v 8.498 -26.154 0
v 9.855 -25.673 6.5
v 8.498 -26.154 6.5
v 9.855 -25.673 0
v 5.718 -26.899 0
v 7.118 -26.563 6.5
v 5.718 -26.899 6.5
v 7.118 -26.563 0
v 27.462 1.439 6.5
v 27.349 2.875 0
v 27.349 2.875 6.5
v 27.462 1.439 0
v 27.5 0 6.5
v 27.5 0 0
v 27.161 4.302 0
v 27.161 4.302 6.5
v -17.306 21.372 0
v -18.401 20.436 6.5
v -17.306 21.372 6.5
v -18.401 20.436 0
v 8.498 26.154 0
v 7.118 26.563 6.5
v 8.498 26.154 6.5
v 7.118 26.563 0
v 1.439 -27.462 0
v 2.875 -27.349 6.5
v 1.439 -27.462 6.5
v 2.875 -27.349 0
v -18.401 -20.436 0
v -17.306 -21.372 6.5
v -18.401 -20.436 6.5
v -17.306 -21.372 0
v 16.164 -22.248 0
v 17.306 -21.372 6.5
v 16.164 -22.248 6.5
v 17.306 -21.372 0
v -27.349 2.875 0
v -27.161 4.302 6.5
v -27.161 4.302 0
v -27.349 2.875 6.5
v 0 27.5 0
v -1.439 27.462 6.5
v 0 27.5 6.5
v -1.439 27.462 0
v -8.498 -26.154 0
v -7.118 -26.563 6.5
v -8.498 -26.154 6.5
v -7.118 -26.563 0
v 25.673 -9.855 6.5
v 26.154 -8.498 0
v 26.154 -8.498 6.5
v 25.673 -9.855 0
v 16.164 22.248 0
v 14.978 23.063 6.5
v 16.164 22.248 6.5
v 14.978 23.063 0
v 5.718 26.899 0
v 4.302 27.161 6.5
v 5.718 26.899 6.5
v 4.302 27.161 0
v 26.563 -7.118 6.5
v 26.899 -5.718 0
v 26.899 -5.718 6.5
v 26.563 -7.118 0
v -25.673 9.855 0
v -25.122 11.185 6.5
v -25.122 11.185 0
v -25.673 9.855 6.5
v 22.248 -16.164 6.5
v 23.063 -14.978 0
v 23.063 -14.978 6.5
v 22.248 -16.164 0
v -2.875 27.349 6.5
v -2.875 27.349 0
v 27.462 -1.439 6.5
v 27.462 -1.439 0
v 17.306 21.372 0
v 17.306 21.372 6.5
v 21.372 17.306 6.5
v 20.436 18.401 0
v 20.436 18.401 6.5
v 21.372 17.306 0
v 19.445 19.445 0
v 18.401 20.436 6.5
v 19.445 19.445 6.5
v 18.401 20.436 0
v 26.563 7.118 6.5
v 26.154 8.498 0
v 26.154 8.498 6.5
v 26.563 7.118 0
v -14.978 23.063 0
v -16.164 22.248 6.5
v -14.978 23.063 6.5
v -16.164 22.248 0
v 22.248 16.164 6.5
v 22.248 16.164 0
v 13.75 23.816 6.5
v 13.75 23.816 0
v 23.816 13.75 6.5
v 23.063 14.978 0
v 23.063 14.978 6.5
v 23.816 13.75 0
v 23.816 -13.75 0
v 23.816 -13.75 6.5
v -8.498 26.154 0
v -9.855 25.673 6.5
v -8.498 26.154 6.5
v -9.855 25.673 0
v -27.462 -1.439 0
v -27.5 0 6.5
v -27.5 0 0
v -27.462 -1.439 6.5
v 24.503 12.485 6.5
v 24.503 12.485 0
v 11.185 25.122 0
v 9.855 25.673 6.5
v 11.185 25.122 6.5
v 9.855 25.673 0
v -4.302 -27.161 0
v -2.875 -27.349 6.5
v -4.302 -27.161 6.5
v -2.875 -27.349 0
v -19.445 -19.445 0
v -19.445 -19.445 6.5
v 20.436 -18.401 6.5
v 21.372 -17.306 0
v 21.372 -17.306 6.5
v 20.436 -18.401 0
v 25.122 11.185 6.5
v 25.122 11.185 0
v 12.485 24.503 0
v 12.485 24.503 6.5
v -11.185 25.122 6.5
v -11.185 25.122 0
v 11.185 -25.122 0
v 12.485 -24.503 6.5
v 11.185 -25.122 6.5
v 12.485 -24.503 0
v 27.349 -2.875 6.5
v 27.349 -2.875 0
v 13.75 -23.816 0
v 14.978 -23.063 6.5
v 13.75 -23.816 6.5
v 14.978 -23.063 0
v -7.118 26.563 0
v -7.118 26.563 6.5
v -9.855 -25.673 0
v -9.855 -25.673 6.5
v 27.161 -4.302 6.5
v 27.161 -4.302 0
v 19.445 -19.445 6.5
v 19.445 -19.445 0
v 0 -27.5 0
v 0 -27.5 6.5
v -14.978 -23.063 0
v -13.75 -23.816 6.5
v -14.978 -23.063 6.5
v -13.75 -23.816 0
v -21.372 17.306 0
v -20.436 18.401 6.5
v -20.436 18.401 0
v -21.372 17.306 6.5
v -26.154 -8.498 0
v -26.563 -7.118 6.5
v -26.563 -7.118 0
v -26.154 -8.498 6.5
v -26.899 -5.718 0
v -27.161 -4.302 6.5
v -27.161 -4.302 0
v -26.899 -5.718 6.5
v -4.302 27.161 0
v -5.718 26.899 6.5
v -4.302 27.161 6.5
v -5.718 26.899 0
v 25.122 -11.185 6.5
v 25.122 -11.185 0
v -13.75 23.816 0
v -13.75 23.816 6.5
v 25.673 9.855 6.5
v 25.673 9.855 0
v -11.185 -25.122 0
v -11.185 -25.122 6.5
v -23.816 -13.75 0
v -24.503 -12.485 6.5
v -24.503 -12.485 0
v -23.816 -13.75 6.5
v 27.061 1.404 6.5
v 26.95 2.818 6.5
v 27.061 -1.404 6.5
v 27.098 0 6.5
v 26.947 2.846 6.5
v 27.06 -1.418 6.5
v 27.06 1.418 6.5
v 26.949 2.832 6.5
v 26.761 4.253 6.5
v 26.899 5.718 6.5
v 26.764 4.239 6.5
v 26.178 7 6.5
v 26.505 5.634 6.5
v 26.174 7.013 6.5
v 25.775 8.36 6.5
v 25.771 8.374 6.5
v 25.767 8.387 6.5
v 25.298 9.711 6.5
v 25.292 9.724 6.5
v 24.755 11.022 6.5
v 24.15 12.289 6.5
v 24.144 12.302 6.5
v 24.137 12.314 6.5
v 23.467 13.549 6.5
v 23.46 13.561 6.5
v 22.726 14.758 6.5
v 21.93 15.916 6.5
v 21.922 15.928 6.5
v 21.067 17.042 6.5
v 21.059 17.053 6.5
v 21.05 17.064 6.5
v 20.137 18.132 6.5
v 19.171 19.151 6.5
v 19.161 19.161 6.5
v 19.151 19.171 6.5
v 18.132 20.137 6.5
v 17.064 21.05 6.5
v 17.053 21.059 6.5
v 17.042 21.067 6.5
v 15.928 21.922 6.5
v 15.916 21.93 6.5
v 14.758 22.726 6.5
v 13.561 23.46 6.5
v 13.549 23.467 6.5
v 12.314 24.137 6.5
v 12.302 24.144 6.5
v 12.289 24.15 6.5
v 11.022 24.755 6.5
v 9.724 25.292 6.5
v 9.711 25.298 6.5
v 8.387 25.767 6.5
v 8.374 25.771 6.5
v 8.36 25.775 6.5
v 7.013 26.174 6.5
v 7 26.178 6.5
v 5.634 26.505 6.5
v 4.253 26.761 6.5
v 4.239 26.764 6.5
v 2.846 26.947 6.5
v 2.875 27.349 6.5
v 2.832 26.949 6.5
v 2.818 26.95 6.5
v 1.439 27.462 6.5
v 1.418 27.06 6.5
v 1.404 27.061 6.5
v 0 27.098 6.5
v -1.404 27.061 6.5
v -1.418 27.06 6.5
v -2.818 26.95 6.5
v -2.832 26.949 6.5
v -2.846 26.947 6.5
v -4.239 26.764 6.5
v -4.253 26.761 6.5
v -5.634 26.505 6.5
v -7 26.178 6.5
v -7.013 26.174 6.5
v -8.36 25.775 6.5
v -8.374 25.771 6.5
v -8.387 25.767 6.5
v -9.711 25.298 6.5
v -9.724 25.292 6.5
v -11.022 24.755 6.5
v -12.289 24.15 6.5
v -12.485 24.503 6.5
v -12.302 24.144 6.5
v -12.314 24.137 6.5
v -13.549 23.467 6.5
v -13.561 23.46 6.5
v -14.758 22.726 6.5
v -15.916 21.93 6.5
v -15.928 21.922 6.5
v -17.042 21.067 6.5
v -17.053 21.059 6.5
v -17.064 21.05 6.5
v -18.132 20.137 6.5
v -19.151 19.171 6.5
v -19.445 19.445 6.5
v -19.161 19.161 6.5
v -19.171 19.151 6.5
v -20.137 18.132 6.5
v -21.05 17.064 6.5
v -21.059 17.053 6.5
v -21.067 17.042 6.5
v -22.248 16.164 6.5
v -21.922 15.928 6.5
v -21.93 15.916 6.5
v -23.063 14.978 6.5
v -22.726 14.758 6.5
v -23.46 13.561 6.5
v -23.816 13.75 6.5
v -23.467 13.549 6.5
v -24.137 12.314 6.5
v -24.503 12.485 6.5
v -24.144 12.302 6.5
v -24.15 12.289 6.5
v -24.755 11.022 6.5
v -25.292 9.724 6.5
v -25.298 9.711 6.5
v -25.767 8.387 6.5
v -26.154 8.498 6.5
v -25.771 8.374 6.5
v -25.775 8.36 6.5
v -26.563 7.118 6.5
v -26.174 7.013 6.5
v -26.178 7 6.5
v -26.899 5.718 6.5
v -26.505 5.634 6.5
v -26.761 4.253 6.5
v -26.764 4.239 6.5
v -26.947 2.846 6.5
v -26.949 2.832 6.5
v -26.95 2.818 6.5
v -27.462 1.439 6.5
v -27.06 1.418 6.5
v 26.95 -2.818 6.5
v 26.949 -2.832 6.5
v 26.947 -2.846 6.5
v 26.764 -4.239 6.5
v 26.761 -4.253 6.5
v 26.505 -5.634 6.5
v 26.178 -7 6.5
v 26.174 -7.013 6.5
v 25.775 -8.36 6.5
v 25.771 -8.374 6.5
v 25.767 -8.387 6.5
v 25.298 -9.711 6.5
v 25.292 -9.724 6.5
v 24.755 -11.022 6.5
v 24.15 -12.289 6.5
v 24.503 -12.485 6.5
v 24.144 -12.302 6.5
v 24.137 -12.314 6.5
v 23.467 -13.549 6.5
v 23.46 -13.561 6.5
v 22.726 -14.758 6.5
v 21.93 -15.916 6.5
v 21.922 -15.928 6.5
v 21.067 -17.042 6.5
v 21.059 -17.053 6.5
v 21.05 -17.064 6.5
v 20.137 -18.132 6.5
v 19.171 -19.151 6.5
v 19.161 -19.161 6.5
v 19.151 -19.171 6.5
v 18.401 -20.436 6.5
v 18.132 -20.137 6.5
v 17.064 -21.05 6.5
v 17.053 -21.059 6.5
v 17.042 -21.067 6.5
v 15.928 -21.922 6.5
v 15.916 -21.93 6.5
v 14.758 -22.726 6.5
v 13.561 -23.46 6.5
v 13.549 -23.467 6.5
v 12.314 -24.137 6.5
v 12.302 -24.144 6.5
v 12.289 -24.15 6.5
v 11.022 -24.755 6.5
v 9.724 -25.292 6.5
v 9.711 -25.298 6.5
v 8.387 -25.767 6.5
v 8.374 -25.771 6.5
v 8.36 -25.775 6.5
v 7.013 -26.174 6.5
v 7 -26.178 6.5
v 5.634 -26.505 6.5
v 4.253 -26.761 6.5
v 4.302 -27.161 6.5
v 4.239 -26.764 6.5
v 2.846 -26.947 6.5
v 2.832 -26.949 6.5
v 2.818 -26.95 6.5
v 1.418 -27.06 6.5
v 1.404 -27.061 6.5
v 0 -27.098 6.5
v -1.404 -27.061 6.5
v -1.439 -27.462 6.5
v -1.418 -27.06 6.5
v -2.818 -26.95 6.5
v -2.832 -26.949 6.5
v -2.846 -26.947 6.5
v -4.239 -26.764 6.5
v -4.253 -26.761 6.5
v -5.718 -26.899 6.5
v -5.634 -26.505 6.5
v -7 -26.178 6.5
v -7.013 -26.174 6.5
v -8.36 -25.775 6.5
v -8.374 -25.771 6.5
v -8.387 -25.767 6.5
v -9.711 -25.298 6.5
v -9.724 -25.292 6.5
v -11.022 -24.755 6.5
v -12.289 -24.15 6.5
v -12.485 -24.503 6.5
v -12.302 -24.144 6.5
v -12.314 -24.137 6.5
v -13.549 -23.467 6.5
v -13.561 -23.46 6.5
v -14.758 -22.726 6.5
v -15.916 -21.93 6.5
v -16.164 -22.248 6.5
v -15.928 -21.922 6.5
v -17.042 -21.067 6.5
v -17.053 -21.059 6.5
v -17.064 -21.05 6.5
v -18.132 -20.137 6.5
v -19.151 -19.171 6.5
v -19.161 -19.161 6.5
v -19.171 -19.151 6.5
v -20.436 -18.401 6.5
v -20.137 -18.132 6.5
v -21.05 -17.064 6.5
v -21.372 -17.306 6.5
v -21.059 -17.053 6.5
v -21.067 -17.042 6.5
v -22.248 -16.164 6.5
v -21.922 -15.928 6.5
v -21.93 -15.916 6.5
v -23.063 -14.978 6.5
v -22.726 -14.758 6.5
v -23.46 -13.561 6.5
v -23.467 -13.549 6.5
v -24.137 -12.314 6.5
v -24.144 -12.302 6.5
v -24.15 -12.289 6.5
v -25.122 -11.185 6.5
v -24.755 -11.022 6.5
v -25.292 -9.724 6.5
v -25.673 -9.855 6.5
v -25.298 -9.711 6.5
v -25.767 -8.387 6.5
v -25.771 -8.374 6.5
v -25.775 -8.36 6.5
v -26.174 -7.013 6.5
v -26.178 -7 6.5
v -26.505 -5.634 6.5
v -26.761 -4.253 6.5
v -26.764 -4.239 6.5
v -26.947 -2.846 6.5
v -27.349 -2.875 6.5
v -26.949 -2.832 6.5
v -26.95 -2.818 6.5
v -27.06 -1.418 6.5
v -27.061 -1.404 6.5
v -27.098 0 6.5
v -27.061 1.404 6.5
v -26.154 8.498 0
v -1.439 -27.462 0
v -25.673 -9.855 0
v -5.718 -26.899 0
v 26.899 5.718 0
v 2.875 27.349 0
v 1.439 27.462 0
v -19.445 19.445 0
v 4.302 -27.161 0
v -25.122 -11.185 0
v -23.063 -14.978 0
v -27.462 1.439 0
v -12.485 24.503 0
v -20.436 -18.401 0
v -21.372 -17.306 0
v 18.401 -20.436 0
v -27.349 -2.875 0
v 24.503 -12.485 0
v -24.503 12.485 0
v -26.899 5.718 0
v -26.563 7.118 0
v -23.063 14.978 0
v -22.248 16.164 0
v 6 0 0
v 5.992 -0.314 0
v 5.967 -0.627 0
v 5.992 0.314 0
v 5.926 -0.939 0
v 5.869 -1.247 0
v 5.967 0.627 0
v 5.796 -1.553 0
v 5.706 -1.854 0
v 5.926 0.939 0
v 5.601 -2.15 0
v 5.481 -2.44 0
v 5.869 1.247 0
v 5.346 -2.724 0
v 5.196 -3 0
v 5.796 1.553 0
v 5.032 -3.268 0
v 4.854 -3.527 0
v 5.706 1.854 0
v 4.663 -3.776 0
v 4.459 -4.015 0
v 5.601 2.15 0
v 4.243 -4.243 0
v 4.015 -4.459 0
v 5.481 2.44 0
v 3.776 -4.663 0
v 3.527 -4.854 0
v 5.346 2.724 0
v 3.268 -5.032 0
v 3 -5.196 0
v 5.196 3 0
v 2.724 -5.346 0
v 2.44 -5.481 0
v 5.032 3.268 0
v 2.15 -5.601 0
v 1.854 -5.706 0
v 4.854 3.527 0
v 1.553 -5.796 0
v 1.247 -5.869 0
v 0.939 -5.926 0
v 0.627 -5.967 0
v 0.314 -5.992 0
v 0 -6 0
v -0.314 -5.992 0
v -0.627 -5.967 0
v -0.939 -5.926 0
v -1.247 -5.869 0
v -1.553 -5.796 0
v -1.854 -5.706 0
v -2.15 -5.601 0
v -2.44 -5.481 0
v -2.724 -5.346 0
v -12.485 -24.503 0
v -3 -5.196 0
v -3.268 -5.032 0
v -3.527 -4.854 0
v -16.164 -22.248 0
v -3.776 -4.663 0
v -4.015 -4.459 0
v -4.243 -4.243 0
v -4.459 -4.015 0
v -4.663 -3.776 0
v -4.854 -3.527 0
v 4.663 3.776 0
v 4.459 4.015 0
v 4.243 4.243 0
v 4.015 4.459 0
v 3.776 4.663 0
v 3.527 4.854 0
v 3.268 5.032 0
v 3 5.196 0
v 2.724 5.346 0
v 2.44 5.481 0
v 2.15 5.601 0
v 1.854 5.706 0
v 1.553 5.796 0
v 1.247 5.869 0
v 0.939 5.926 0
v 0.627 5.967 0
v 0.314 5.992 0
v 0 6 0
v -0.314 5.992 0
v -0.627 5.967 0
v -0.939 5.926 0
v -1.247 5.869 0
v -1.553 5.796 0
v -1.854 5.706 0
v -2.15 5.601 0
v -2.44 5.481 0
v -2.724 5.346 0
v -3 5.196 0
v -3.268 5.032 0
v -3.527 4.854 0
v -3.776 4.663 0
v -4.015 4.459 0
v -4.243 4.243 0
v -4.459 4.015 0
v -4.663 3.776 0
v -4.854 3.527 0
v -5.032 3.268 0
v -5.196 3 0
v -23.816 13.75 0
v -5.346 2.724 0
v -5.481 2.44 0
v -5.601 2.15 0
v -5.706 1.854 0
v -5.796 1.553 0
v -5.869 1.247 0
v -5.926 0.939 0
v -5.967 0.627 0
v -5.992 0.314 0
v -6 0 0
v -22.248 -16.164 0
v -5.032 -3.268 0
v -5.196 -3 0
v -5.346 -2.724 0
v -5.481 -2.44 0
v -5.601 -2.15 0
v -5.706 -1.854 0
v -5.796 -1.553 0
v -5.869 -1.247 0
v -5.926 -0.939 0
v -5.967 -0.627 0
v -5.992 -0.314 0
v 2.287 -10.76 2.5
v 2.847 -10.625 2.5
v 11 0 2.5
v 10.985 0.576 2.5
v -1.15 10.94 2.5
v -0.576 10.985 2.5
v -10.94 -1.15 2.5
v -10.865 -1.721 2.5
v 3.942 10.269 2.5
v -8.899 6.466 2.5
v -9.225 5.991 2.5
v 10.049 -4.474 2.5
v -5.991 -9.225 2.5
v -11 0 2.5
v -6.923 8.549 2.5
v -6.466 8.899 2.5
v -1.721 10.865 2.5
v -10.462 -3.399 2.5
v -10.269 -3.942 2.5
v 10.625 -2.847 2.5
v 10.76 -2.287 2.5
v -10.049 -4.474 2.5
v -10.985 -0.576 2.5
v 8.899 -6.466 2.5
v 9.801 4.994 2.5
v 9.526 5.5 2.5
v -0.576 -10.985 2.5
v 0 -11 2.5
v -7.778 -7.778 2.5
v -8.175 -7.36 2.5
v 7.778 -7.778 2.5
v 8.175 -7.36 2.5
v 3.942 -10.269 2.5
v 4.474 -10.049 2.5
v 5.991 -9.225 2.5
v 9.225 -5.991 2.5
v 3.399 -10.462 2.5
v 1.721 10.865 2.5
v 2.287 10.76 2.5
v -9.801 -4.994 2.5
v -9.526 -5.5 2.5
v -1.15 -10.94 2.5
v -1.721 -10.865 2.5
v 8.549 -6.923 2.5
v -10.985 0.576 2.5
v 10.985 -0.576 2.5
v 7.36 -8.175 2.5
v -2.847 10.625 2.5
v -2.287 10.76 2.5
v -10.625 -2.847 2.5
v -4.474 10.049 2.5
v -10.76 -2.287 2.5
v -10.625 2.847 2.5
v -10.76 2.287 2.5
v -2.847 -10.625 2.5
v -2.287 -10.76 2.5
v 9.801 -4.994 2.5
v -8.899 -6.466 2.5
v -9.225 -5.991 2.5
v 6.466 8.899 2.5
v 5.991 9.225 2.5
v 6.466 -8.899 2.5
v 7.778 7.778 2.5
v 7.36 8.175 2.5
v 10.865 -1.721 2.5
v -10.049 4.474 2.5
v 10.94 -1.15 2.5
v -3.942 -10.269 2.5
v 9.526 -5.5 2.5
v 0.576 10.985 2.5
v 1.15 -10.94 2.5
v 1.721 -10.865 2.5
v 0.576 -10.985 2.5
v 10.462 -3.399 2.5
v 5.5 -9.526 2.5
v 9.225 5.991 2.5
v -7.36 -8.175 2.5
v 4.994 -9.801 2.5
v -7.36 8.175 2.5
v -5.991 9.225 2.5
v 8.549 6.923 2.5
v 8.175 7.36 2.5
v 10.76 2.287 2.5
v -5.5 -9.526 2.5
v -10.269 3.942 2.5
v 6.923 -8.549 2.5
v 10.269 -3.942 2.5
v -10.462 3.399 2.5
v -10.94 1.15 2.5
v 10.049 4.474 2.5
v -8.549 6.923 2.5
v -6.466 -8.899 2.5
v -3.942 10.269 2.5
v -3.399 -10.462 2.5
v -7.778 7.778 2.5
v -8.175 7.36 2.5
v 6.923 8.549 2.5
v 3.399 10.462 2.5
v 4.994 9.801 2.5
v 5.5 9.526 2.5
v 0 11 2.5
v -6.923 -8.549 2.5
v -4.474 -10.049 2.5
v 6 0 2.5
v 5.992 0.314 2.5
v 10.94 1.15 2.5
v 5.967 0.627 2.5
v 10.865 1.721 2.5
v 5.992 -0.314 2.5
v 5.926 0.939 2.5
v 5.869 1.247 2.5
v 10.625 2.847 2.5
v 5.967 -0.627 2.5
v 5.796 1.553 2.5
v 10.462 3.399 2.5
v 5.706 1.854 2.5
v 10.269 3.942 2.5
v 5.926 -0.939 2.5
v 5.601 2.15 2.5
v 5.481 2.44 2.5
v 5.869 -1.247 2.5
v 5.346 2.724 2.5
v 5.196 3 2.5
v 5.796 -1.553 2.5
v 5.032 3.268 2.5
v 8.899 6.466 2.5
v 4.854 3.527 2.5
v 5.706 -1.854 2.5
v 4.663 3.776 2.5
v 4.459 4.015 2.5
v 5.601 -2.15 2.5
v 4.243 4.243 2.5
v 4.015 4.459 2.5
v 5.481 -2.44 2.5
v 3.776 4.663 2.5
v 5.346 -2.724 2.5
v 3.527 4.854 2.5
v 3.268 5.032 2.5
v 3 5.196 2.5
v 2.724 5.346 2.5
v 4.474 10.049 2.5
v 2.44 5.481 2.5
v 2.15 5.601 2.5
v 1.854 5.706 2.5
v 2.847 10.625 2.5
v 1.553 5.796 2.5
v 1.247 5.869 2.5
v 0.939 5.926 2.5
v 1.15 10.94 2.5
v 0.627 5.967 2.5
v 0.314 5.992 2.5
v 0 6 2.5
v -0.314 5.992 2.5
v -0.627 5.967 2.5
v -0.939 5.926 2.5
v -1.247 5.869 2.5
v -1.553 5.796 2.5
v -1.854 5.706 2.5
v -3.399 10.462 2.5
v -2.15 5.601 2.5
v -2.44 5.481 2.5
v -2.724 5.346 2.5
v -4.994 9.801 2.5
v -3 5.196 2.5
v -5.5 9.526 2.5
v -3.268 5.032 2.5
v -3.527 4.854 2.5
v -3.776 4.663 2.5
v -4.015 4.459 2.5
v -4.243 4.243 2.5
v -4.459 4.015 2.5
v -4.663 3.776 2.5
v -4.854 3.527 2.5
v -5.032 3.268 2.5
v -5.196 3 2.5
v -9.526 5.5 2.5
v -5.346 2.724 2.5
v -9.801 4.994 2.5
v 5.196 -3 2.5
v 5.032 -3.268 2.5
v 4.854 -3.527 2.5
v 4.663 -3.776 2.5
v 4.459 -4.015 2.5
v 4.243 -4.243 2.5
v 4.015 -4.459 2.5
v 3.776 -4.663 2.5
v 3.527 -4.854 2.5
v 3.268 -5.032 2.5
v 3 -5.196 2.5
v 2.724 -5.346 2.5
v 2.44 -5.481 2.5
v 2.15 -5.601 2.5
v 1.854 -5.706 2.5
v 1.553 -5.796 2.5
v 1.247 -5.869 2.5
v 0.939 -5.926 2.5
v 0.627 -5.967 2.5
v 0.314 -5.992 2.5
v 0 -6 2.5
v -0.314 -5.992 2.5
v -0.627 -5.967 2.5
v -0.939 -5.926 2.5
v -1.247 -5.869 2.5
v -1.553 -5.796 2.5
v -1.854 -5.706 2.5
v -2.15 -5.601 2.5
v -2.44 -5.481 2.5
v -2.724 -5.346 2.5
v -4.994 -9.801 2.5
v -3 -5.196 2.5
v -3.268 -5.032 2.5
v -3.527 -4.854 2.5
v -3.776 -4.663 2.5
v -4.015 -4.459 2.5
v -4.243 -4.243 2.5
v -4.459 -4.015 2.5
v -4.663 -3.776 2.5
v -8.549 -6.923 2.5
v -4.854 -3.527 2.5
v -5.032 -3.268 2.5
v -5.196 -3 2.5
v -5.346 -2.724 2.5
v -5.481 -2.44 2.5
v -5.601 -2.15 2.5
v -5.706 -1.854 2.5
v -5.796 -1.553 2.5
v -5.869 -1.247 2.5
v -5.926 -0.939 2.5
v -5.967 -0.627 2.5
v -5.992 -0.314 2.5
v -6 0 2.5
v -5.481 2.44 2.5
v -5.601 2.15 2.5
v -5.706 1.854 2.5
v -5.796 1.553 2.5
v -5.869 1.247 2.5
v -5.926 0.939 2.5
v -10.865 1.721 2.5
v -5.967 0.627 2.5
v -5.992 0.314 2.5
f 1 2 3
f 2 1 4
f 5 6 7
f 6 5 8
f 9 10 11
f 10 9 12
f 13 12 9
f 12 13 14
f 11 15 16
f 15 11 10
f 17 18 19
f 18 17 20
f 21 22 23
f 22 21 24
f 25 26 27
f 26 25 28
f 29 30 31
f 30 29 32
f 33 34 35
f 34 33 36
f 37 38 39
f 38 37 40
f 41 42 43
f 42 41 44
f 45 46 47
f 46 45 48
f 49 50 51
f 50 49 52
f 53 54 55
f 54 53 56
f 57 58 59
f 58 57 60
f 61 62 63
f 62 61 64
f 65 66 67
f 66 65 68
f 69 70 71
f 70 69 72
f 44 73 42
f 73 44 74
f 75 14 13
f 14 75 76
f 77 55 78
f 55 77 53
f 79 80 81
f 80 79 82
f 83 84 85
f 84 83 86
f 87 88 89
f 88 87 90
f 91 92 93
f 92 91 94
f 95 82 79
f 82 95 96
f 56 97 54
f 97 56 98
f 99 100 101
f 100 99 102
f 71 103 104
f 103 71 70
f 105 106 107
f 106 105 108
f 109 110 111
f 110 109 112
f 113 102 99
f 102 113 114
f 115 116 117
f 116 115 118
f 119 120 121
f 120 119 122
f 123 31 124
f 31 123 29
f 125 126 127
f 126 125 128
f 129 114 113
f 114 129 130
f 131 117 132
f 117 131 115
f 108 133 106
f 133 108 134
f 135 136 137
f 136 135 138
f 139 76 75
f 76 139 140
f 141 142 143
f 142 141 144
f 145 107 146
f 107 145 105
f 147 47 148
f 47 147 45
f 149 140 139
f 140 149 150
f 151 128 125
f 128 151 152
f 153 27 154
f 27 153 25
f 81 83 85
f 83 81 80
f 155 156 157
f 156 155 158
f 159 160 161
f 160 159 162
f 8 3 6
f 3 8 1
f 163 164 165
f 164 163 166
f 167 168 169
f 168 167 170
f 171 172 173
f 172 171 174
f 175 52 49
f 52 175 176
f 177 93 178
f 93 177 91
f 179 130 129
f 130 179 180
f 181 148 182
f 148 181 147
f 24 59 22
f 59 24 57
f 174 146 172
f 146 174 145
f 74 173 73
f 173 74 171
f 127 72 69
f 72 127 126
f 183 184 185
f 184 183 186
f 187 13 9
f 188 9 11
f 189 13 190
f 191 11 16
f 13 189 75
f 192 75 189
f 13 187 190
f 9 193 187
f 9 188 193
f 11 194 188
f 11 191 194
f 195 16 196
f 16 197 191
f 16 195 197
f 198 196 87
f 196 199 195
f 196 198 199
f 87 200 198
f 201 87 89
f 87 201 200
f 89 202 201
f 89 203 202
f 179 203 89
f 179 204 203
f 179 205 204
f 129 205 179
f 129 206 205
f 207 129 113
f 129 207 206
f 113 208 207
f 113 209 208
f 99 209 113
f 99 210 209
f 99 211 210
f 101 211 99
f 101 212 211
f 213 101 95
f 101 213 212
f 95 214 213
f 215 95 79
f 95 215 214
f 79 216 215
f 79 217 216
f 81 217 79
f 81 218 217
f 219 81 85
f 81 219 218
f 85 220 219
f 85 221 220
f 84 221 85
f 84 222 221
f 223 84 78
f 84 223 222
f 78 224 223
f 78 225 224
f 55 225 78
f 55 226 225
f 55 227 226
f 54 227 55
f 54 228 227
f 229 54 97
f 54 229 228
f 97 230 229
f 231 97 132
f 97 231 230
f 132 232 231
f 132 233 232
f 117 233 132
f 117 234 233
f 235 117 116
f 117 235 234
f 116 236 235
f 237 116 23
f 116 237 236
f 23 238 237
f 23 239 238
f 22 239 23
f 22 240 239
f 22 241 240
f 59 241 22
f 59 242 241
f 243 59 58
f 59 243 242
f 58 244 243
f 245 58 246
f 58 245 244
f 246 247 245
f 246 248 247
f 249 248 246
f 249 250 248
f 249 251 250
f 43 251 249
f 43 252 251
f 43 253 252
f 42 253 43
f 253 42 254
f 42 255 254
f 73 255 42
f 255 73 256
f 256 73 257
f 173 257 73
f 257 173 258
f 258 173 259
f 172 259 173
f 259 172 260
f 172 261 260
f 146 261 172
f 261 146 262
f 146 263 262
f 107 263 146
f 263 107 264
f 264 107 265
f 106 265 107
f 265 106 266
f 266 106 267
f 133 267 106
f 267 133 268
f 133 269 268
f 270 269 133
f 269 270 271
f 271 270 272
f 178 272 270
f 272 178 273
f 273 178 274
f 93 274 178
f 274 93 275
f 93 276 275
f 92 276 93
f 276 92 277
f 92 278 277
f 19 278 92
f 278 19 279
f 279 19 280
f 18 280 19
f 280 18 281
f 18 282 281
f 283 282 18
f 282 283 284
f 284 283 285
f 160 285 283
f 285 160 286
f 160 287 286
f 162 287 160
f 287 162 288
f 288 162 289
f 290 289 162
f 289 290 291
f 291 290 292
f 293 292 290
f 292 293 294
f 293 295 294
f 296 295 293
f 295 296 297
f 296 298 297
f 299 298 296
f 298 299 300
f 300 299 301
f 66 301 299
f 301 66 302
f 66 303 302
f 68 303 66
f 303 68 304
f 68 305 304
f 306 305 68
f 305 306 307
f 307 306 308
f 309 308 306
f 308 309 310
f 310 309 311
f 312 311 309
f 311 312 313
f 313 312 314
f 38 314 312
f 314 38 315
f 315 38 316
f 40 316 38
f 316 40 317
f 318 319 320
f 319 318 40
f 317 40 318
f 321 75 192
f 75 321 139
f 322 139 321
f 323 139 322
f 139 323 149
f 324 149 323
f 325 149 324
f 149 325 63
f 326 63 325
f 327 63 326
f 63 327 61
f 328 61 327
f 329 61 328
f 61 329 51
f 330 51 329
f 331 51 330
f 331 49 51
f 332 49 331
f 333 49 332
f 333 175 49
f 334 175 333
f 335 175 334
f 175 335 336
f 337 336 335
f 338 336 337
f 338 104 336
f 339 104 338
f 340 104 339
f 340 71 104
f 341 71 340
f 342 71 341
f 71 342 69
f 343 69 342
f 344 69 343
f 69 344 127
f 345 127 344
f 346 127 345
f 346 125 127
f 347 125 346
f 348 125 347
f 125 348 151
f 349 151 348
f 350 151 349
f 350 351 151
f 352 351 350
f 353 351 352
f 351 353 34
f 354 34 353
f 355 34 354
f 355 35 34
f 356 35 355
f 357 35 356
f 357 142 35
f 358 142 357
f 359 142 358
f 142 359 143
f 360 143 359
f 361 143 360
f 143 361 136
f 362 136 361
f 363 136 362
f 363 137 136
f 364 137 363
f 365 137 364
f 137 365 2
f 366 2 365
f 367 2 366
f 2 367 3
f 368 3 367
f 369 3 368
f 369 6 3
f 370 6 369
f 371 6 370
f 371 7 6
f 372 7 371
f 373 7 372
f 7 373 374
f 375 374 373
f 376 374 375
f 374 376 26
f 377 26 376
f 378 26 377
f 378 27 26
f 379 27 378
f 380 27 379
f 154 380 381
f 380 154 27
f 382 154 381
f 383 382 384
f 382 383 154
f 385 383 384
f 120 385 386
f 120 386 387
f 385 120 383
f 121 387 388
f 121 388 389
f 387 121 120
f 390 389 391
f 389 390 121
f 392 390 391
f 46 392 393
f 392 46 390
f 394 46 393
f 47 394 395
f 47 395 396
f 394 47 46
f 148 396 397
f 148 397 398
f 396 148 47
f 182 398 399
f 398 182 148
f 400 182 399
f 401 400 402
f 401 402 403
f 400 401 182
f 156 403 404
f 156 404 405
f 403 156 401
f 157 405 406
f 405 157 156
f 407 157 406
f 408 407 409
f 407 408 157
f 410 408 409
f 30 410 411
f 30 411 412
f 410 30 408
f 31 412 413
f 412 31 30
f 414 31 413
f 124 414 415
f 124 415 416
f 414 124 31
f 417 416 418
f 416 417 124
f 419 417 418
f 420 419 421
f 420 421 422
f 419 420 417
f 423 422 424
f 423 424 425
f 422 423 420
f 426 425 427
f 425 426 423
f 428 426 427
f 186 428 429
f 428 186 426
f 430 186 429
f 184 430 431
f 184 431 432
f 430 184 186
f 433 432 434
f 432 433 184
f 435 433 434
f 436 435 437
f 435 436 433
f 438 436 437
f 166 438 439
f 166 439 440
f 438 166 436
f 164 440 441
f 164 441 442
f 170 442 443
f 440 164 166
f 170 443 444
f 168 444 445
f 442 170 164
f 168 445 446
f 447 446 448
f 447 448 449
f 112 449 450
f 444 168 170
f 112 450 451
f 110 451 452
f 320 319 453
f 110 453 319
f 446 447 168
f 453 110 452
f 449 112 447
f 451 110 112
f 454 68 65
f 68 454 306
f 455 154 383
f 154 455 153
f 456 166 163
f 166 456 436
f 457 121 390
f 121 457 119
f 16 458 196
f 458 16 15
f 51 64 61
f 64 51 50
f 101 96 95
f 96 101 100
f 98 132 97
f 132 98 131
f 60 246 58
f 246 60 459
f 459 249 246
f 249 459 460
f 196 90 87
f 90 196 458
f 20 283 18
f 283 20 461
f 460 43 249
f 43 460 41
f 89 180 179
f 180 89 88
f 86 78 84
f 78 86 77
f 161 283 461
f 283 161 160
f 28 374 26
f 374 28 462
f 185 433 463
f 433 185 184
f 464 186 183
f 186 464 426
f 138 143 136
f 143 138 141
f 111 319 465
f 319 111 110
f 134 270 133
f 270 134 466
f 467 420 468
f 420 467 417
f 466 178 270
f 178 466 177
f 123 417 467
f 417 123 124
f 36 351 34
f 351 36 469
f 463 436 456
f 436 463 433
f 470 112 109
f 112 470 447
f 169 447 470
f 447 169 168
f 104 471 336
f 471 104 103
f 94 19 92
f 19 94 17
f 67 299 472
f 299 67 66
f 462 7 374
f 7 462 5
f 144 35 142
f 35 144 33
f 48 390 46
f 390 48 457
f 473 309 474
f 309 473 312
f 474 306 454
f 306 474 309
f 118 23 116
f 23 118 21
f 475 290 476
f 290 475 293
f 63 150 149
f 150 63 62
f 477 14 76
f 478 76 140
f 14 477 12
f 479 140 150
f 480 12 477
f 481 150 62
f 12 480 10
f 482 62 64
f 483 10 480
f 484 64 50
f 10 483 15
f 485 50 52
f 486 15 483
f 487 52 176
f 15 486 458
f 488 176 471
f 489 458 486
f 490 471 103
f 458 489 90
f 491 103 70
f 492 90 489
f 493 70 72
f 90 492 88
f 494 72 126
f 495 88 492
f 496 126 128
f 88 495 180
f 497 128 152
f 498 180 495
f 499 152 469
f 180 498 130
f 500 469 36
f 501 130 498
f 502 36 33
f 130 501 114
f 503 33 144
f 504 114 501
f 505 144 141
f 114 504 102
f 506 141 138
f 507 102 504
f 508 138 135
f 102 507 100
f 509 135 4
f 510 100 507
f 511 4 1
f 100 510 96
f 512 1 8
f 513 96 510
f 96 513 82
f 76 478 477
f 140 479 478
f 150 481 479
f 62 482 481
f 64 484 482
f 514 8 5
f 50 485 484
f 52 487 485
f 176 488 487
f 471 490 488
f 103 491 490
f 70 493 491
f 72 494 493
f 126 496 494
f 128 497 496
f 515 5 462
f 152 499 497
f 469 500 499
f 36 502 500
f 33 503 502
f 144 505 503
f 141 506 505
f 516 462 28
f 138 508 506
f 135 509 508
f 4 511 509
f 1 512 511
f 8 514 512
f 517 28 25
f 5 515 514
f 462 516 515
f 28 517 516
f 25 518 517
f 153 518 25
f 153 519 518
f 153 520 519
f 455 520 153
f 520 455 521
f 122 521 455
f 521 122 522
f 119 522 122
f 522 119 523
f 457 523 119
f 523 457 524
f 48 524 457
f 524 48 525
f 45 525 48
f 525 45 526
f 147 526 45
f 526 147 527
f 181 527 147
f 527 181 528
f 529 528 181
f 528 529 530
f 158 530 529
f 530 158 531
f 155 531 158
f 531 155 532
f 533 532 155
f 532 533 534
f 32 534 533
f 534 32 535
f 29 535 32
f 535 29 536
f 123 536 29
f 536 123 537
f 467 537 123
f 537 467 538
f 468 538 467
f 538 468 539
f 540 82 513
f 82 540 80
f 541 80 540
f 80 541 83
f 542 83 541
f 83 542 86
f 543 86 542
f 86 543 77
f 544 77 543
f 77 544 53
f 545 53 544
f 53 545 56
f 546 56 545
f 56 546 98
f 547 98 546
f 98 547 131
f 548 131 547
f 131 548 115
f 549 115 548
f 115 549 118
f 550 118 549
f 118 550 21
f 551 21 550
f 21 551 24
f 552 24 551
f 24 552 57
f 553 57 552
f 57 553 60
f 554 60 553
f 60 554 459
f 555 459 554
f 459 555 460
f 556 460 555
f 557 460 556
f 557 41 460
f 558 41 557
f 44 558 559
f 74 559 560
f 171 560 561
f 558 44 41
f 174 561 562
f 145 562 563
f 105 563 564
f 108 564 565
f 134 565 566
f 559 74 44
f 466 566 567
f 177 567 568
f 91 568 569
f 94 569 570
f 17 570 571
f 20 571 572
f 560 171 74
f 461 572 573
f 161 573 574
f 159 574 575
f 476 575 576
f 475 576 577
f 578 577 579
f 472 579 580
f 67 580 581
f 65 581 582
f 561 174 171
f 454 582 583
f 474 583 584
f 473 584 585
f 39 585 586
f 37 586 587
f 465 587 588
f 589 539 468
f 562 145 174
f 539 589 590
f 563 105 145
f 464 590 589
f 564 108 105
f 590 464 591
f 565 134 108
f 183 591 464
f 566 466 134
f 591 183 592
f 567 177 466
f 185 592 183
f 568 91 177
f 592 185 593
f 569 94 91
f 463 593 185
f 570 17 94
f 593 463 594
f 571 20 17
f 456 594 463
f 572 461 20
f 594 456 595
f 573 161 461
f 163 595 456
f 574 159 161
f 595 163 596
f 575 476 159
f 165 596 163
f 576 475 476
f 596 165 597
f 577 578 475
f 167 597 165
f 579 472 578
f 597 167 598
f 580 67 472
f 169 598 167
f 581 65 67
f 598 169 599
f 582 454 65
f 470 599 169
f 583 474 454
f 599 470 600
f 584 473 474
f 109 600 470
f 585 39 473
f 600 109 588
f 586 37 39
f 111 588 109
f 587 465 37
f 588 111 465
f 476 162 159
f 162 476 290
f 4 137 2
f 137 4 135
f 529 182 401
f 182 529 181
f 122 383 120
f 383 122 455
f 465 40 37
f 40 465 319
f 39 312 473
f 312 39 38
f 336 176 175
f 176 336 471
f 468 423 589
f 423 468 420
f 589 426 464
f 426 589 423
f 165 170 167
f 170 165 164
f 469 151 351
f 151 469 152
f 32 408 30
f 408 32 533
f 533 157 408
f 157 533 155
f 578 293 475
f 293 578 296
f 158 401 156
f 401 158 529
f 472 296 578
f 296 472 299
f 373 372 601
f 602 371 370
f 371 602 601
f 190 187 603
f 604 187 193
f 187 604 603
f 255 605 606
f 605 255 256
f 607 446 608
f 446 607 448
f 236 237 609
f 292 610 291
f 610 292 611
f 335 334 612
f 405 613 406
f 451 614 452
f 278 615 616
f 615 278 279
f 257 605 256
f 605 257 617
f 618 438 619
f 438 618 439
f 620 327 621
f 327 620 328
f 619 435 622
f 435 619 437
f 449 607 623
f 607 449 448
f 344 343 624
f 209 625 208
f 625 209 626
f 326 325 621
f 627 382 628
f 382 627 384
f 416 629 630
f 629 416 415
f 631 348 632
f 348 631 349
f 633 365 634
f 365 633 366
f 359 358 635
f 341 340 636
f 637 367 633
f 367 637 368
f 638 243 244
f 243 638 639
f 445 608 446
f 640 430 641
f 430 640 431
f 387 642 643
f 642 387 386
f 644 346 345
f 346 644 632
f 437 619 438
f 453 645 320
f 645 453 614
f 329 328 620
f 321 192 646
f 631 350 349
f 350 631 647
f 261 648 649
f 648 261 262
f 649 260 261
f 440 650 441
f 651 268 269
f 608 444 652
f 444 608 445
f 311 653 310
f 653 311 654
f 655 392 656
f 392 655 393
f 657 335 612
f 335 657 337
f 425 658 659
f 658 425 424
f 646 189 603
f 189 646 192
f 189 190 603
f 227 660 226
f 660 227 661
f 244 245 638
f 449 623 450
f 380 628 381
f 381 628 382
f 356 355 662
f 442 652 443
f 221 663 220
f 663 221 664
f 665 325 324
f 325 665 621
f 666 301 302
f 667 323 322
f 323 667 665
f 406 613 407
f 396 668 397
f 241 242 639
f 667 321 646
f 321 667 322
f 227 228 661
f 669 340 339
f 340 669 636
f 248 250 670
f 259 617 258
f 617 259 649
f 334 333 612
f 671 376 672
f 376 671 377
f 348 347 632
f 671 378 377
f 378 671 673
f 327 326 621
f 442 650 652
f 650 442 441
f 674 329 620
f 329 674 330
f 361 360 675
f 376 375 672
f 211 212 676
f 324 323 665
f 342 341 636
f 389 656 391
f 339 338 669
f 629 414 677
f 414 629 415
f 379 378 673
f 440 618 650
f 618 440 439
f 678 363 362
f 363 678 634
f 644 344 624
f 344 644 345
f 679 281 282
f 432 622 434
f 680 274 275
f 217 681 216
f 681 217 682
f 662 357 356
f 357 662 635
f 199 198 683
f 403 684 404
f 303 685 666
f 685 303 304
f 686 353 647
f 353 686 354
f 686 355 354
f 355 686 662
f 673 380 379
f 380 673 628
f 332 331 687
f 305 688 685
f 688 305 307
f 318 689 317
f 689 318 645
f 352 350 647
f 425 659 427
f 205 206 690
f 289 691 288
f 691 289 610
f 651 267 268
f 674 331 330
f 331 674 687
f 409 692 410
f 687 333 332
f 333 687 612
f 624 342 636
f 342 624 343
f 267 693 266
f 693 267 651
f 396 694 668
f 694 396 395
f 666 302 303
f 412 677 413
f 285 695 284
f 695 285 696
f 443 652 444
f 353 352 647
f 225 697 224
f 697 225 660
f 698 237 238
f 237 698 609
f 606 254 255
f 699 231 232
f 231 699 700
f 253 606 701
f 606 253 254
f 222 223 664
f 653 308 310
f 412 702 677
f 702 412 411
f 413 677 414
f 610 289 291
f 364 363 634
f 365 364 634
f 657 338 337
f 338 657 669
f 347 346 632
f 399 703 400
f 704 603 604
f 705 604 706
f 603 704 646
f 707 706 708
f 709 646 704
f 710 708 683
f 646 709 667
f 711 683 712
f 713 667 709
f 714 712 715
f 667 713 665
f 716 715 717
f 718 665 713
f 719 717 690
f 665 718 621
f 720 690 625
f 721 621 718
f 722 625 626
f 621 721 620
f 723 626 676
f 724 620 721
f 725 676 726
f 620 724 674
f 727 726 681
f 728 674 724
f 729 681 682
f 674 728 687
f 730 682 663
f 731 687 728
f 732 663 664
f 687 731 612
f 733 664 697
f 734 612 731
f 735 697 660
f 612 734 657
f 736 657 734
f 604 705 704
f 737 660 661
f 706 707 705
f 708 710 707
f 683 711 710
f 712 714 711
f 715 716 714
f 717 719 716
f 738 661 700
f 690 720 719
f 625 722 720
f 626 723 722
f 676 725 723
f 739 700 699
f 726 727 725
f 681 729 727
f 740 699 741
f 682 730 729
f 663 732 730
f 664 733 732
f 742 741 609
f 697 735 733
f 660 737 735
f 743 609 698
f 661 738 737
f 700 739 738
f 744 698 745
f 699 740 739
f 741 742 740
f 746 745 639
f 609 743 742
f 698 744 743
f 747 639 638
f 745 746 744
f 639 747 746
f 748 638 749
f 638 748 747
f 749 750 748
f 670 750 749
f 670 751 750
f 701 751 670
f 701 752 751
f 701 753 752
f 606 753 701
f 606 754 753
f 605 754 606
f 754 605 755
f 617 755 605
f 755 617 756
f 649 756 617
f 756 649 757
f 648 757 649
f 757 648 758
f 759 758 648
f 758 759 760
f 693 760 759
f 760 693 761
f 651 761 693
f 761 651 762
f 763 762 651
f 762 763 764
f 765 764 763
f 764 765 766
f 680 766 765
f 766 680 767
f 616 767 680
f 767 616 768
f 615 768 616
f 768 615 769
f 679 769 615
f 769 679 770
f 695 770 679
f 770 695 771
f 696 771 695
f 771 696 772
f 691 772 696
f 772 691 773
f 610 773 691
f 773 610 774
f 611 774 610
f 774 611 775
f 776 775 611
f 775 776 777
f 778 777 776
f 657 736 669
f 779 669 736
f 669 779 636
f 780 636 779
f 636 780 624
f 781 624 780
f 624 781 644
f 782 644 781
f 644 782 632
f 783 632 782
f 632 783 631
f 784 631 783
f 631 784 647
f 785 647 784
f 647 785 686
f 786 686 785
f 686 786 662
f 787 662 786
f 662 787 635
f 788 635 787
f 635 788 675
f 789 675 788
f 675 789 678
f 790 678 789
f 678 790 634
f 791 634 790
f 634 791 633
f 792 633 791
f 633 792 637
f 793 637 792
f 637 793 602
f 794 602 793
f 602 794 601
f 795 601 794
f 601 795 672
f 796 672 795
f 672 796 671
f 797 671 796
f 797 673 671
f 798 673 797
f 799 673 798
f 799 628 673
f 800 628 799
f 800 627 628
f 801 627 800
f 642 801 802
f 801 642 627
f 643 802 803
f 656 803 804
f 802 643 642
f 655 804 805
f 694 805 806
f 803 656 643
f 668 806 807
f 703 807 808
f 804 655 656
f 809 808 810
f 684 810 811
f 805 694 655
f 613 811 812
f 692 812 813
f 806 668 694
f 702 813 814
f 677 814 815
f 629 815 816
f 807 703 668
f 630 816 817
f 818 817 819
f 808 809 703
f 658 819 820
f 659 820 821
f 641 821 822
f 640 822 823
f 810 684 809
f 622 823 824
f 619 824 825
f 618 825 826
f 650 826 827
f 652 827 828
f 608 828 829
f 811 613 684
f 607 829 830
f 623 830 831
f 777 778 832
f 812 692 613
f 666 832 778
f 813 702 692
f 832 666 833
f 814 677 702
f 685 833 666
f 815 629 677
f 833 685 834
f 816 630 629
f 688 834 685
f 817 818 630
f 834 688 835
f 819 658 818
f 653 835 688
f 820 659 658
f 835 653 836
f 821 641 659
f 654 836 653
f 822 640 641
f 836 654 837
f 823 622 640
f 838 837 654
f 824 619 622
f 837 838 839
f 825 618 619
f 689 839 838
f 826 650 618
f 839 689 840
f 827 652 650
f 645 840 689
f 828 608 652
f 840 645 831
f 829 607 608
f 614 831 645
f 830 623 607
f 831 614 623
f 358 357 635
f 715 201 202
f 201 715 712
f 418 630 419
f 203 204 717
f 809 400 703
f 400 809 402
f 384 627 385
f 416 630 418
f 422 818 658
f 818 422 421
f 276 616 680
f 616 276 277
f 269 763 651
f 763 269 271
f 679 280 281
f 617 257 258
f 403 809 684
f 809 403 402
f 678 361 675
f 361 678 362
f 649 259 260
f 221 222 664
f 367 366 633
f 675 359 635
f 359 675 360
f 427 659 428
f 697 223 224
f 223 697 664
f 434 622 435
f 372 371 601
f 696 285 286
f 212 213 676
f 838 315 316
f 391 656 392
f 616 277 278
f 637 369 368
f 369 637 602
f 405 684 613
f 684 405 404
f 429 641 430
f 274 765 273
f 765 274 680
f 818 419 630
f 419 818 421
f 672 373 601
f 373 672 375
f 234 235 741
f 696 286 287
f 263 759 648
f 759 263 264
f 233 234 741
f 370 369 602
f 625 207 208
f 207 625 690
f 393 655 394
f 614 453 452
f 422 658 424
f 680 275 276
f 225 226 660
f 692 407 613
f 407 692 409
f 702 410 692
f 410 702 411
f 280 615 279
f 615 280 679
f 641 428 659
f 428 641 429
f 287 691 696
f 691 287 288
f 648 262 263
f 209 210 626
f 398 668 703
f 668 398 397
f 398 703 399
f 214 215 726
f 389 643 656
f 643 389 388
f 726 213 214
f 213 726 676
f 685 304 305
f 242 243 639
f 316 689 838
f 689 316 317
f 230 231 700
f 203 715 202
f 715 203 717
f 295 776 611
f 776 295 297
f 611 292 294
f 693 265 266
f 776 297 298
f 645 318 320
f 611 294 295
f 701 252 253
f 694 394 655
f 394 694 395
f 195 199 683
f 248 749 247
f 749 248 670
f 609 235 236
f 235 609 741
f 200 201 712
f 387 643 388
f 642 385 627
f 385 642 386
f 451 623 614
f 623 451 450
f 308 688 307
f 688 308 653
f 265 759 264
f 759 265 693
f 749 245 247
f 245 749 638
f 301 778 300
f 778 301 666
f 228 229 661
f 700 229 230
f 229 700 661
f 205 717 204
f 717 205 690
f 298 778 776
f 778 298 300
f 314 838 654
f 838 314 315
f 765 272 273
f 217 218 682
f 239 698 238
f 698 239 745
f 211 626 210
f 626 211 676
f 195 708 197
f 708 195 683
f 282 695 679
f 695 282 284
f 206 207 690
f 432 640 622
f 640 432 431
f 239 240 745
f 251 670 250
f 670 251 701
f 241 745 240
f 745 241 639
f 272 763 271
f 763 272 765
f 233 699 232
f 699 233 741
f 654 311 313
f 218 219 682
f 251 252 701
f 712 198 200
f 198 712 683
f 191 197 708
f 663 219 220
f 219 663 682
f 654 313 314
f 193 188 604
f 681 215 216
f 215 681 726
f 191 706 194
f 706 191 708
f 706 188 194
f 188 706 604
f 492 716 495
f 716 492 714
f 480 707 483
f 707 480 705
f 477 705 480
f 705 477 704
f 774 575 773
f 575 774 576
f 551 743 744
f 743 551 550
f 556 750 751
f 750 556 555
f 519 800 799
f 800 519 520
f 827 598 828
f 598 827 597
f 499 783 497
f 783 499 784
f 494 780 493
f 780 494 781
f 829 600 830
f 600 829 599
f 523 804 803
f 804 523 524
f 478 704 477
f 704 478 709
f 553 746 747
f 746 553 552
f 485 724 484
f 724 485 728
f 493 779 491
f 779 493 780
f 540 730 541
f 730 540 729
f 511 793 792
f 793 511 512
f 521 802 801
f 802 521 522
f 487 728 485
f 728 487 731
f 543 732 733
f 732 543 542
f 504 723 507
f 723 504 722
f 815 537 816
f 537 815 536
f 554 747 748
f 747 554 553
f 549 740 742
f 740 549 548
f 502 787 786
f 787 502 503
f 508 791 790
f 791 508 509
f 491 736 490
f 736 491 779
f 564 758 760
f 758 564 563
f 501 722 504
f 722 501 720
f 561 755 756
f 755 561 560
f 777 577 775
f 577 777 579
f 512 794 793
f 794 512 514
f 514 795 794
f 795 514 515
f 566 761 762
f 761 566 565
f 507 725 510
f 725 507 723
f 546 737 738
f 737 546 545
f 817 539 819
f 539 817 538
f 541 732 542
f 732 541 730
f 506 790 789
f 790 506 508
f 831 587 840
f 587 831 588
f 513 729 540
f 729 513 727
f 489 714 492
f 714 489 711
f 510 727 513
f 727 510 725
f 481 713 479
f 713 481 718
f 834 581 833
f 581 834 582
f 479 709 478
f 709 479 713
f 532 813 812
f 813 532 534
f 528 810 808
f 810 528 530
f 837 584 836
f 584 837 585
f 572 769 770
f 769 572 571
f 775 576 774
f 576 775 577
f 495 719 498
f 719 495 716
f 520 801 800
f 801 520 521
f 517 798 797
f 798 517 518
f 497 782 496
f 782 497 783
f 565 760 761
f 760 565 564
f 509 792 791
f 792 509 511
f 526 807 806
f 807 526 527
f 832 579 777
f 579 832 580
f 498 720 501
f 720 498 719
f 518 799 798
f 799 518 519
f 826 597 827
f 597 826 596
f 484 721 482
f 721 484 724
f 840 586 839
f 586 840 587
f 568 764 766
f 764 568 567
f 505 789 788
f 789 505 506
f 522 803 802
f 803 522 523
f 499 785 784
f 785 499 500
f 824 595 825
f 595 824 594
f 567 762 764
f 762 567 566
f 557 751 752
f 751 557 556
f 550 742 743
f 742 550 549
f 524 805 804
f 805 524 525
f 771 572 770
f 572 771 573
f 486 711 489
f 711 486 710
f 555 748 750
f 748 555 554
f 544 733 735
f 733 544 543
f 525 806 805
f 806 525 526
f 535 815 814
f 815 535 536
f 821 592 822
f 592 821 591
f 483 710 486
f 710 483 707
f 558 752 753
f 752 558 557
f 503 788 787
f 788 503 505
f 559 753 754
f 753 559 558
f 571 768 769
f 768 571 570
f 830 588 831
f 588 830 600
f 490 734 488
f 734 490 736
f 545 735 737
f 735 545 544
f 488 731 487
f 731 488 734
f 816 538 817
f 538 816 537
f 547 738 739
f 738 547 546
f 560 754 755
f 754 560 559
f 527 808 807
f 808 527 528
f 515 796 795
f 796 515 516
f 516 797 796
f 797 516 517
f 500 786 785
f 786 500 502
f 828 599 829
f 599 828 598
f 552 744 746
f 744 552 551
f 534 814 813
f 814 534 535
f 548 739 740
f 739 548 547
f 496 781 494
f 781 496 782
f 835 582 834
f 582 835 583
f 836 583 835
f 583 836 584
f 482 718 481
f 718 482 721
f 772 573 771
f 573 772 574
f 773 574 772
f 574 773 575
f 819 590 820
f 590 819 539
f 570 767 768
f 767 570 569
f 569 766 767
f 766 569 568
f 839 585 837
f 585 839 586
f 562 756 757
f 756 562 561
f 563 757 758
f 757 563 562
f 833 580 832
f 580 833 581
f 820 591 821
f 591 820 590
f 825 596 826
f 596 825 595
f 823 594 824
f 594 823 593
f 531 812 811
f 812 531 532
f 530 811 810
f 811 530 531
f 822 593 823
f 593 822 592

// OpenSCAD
$fn=120;
max_d=55;
max_r=max_d/2;
bolt_d=12;
bolt_r=bolt_d/2;
flat_d=22;
flat_r=flat_d/2;
min_h=2.5;
max_h=min_h+4;
pad=0.1;


difference() {
    cylinder(r=max_r,h=max_h);
    translate([0,0,min_h])
    cylinder(r1=flat_r,r2=max_r,h=max_h-min_h+pad);
    cylinder(r=bolt_r,h=max_h);

}
